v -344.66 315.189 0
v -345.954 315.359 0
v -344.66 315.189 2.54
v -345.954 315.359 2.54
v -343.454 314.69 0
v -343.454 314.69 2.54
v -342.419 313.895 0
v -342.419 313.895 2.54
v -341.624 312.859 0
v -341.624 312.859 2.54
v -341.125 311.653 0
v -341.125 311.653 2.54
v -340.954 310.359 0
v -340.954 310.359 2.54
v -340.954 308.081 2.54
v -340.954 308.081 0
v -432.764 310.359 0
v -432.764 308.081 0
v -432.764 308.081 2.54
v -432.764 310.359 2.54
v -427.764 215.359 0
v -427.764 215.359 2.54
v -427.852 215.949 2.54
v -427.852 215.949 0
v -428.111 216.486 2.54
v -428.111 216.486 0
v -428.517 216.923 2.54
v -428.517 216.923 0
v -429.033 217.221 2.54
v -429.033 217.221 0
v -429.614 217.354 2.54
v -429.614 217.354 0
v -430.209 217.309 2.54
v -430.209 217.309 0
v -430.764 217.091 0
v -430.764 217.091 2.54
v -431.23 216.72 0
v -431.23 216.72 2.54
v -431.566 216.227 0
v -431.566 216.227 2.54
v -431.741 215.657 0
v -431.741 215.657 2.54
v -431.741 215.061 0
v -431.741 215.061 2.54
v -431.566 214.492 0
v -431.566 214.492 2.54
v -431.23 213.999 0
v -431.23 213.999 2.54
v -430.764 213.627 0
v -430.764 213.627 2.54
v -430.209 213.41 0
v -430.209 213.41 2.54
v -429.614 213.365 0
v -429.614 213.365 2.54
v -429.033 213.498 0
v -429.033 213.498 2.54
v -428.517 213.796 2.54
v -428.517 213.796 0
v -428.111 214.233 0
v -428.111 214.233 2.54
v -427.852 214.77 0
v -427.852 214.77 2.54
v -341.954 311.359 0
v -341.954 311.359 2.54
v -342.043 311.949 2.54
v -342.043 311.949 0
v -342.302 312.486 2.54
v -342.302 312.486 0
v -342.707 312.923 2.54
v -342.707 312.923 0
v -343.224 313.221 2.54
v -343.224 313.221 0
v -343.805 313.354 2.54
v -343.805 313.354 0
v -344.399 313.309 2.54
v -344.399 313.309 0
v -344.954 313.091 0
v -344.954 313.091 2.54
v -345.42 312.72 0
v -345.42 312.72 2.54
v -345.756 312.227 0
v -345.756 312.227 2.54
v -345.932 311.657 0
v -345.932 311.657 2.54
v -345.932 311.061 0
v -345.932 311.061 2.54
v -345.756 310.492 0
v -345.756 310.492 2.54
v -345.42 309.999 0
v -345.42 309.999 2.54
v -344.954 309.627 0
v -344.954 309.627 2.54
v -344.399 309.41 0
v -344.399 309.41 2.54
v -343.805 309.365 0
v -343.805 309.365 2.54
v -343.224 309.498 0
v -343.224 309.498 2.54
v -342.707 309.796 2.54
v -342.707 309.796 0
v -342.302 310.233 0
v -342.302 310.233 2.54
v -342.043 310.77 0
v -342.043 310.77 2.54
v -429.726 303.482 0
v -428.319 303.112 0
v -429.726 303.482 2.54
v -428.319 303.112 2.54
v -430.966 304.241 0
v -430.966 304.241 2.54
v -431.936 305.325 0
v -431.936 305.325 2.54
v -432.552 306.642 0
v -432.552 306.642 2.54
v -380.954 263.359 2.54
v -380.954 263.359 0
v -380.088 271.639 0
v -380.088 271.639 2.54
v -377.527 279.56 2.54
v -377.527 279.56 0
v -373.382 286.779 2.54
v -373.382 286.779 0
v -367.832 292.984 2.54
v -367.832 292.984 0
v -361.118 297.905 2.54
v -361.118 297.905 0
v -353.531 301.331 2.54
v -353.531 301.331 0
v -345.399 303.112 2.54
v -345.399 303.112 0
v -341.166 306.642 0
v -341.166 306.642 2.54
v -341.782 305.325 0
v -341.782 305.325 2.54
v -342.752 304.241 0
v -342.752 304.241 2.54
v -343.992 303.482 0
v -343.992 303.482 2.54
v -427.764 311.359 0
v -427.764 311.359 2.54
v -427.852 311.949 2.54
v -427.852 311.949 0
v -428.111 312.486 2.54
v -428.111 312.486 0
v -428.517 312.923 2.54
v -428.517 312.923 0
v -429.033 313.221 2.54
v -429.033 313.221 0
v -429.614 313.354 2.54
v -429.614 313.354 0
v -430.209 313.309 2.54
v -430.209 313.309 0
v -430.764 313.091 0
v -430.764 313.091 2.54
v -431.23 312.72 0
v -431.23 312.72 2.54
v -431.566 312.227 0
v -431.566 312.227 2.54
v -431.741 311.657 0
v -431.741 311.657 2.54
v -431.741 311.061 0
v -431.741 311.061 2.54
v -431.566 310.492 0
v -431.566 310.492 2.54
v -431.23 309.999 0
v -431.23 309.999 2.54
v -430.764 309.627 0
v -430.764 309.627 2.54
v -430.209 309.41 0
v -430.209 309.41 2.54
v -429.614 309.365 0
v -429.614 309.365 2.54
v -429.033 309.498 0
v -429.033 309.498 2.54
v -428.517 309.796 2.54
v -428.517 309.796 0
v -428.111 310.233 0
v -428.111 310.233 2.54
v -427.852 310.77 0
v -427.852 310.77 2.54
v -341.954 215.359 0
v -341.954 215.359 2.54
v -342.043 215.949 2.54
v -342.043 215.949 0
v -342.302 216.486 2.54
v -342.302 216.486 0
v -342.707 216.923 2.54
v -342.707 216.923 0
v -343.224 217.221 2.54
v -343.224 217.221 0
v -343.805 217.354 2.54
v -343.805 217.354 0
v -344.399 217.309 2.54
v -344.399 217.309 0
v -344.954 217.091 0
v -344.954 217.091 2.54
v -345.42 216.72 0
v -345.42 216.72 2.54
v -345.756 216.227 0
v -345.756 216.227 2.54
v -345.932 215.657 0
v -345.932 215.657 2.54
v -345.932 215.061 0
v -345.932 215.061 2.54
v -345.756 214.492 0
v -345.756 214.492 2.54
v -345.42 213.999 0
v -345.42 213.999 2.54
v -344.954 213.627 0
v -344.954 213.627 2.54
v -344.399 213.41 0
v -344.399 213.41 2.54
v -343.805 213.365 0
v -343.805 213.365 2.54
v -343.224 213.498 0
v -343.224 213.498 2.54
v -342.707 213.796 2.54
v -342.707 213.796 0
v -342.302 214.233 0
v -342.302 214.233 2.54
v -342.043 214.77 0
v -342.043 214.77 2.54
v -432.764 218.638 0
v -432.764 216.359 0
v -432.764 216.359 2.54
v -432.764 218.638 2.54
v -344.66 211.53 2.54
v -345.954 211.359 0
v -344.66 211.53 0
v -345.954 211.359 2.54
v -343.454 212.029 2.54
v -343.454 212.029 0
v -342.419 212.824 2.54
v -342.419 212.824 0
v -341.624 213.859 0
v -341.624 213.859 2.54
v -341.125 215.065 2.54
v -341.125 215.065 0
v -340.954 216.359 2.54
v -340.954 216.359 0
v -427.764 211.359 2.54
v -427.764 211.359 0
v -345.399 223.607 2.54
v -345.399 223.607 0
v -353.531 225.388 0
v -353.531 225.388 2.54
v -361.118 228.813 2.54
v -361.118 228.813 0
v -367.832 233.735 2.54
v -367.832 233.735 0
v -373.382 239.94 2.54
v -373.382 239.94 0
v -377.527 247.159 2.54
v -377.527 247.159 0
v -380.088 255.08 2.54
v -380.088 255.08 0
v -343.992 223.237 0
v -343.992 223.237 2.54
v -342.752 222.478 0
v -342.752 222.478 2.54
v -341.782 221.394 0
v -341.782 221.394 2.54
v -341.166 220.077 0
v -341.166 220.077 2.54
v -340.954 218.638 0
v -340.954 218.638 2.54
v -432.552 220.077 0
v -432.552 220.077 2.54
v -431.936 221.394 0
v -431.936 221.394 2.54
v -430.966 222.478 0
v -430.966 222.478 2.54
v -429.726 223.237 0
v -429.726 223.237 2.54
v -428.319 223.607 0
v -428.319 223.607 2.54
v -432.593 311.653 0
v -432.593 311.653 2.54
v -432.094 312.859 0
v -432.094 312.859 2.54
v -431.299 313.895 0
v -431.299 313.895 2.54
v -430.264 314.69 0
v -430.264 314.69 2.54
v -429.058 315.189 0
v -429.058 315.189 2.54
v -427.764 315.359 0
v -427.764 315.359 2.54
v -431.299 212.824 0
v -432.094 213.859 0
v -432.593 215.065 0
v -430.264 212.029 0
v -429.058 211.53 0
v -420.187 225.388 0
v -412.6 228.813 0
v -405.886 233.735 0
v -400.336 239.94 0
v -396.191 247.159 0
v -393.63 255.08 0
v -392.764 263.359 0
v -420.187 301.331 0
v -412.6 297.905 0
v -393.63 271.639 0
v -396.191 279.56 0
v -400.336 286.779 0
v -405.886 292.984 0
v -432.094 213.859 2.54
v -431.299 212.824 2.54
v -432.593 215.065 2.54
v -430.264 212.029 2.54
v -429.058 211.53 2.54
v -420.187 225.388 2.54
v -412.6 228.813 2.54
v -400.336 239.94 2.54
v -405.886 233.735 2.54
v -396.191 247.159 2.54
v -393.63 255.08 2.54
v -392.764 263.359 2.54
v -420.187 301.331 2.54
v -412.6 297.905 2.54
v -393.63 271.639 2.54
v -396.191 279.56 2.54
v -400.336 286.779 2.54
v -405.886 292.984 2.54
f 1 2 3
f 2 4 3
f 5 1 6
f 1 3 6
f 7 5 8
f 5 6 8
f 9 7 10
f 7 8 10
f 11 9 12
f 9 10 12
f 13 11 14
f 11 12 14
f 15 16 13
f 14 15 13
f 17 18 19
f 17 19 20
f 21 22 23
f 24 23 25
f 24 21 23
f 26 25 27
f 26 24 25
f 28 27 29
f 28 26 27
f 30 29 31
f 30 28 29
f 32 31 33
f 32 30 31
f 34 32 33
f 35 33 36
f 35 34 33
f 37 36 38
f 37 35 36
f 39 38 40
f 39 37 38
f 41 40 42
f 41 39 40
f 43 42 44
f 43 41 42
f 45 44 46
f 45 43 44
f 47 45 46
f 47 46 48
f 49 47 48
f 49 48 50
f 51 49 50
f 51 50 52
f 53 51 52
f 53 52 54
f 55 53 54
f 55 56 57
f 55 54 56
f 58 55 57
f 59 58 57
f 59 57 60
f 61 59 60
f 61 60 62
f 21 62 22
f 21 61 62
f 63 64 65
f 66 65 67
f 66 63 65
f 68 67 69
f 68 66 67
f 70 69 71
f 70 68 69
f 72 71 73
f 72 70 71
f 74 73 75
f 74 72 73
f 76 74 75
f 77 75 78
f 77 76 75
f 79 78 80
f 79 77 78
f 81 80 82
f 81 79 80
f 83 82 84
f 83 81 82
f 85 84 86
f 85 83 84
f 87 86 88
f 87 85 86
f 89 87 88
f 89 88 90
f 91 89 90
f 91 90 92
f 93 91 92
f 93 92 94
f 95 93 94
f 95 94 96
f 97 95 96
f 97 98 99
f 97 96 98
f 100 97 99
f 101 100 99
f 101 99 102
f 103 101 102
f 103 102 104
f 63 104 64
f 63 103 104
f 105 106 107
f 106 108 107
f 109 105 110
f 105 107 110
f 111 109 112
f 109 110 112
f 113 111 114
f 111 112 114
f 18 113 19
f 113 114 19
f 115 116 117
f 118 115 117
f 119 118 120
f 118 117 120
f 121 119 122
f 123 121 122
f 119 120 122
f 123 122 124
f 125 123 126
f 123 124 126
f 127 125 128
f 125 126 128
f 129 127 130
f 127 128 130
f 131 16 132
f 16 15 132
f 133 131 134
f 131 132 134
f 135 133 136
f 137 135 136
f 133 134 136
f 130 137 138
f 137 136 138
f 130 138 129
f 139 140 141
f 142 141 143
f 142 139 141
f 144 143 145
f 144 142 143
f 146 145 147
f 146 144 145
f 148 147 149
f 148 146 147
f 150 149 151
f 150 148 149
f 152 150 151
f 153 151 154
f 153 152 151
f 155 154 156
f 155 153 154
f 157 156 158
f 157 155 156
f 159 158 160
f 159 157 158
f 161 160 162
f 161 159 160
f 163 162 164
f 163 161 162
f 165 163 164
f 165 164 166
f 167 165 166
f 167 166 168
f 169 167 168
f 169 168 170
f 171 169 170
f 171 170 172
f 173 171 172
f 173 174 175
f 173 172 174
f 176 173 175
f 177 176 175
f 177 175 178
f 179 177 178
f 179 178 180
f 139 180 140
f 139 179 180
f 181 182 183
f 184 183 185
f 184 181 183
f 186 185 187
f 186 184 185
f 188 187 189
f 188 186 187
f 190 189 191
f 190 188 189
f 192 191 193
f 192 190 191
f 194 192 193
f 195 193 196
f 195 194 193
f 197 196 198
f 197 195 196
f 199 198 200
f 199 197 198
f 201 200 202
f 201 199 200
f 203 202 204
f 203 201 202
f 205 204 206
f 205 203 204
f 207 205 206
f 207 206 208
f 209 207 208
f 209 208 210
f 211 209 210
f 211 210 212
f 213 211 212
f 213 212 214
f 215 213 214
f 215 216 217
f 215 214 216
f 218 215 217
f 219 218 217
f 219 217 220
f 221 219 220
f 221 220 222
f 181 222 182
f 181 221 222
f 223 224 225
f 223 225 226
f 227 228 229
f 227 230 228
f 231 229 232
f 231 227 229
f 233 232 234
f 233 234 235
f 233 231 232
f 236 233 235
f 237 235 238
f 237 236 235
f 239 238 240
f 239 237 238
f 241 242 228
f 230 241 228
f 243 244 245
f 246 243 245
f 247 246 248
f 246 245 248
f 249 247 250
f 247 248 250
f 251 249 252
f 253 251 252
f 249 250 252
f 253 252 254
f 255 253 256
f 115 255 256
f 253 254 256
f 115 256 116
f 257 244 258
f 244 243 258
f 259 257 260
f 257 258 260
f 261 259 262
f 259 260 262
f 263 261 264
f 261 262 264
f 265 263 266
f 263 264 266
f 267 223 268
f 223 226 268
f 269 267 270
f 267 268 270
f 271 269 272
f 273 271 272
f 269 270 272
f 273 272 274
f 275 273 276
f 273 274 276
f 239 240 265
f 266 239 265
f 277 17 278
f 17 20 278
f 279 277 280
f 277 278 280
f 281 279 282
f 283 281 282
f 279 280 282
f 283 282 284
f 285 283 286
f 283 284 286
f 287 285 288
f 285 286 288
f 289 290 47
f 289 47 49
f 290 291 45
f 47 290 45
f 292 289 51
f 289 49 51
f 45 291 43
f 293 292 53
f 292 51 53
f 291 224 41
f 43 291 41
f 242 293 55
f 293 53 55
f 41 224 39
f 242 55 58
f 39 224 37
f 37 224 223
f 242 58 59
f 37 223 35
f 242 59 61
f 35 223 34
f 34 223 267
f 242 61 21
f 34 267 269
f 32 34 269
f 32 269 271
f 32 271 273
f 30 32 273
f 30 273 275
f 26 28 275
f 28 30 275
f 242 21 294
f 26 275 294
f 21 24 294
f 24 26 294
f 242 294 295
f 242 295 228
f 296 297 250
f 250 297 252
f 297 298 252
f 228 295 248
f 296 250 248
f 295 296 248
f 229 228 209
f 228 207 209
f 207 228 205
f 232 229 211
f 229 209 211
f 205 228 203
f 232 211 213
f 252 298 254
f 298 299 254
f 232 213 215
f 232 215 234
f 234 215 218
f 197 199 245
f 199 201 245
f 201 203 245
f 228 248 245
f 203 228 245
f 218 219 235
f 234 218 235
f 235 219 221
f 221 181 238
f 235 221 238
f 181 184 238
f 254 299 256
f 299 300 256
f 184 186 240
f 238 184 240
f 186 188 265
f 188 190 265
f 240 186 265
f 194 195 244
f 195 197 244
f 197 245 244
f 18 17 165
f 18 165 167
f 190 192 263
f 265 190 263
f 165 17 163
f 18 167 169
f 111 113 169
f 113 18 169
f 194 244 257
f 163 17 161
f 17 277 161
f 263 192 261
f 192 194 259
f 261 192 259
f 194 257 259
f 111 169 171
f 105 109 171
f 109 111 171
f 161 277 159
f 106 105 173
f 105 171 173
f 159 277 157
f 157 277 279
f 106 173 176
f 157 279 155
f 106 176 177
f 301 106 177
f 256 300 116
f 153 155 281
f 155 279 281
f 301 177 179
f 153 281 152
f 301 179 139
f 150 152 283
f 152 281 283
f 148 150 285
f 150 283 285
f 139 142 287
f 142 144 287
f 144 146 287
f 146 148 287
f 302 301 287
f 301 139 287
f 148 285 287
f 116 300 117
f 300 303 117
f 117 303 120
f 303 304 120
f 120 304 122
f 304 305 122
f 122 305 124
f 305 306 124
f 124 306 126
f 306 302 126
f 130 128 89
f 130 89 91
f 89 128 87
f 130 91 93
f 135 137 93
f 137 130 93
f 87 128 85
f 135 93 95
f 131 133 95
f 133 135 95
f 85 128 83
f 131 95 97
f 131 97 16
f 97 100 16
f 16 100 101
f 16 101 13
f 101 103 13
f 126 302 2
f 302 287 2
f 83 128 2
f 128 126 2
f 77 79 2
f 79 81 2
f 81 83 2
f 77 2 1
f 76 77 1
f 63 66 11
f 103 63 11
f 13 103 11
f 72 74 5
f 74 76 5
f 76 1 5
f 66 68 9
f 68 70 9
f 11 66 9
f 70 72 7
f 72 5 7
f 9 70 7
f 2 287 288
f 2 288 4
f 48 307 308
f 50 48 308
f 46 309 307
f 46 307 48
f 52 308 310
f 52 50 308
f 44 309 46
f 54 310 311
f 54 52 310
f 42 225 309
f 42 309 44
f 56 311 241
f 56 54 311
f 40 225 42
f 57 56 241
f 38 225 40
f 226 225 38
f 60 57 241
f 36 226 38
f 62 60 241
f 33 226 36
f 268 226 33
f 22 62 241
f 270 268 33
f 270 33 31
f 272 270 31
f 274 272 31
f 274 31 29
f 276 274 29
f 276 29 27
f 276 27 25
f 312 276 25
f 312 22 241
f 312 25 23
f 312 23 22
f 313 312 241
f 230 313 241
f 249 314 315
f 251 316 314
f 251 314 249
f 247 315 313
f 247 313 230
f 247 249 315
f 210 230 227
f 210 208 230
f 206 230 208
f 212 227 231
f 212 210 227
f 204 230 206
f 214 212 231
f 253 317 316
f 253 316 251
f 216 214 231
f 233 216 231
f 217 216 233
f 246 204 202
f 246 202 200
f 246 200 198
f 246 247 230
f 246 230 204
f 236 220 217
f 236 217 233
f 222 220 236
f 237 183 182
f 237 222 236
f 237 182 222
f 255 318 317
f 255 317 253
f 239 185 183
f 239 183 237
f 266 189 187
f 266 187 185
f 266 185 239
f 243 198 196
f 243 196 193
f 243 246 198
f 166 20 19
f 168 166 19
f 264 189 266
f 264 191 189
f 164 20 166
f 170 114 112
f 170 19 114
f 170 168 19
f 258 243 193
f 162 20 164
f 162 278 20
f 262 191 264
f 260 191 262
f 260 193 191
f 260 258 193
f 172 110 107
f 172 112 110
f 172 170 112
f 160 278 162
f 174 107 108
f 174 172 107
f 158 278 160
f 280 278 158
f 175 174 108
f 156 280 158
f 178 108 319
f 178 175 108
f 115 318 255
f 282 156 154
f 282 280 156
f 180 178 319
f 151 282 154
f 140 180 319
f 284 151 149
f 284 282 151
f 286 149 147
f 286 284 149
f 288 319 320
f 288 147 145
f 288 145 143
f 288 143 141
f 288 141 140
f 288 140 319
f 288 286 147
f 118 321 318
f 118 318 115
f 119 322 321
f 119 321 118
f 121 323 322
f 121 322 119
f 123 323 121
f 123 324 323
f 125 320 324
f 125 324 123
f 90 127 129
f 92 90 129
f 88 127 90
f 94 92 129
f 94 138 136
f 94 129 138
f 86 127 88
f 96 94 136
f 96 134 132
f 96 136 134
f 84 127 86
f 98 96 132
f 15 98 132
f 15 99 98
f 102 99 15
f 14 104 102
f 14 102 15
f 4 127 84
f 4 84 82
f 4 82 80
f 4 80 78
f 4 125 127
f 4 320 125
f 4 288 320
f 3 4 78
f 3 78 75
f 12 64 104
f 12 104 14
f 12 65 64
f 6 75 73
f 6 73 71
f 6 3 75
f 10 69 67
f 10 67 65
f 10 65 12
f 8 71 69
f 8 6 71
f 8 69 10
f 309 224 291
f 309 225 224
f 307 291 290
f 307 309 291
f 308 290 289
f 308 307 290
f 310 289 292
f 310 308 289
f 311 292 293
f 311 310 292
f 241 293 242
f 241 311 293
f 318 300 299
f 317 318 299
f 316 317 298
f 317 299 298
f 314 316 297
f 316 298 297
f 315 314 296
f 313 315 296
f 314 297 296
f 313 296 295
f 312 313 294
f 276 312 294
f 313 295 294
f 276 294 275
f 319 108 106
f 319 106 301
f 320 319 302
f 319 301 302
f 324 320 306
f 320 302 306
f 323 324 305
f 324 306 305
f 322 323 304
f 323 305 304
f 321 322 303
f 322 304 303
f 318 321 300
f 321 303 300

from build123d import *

# Parameters (mm, degrees)
SKETCH2_W           = 91.809324831
SKETCH2_H           = 104
BOSS_EXTRUDE1_DEPTH = 2.54
SKETCH1_R           = 2
CUT_EXTRUDE1_DEPTH  = 536.483262079
CUT_EXTRUDE2_DEPTH  = 10
FILLET1_R           = 5


with BuildPart() as part:
    # Sketch2 → Boss-Extrude1 (new body)
    with BuildSketch(Plane.XY):
        with Locations((-386.858920313, 263.359404222)):
            Rectangle(SKETCH2_W, SKETCH2_H)
    extrude(amount=BOSS_EXTRUDE1_DEPTH)

    # Sketch1 → Cut-Extrude1 (cut, through all)
    with BuildSketch(Plane.XY):
        with Locations((-343.954257897, 311.359404222)):
            Circle(SKETCH1_R)
        with Locations((-429.763582728, 311.359404222)):
            Circle(SKETCH1_R)
        with Locations((-429.763582728, 215.359404222)):
            Circle(SKETCH1_R)
        with Locations((-343.954257897, 215.359404222)):
            Circle(SKETCH1_R)
    extrude(amount=CUT_EXTRUDE1_DEPTH, mode=Mode.SUBTRACT)

    # Sketch3 → Cut-Extrude2 (cut)
    with BuildSketch(Plane(origin=(0, 0, 0), x_dir=(-1, 0, 0), z_dir=(0, 0, -1))):
        with BuildLine():
            Line((380.954257897, 263.359404222), (340.954257897, 263.359404222))
            Line((340.954257897, 263.359404222), (340.954257897, 223.359404222))
            ThreePointArc((340.954257897, 223.359404222), (369.238529145, 235.075132974), (380.954257897, 263.359404222))
        make_face()
        with BuildLine():
            Line((340.954257897, 303.359404222), (340.954257897, 263.359404222))
            Line((340.954257897, 263.359404222), (380.954257897, 263.359404222))
            ThreePointArc((380.954257897, 263.359404222), (369.238529145, 291.643675469), (340.954257897, 303.359404222))
        make_face()
        with BuildLine():
            ThreePointArc((432.763582728, 303.359404222), (404.47931148, 291.643675469), (392.763582728, 263.359404222))
            Line((392.763582728, 263.359404222), (432.763582728, 263.359404222))
            Line((432.763582728, 263.359404222), (432.763582728, 303.359404222))
        make_face()
        with BuildLine():
            Line((432.763582728, 263.359404222), (392.763582728, 263.359404222))
            ThreePointArc((392.763582728, 263.359404222), (404.47931148, 235.075132974), (432.763582728, 223.359404222))
            Line((432.763582728, 223.359404222), (432.763582728, 263.359404222))
        make_face()
    extrude(amount=-CUT_EXTRUDE2_DEPTH, mode=Mode.SUBTRACT)

    # Fillet1
    fillet1_edges = [part.edges().sort_by_distance(p)[0] for p in [
        (-340.954257897, 303.359404222, 1.27),
        (-340.954257897, 223.359404222, 1.27),
        (-432.763582728, 303.359404222, 1.27),
        (-432.763582728, 223.359404222, 1.27),
        (-432.763582728, 211.359404222, 1.27),
        (-340.954257897, 211.359404222, 1.27),
        (-340.954257897, 315.359404222, 1.27),
        (-432.763582728, 315.359404222, 1.27),
    ]]
    fillet(fillet1_edges, radius=FILLET1_R)


solid = part.part
